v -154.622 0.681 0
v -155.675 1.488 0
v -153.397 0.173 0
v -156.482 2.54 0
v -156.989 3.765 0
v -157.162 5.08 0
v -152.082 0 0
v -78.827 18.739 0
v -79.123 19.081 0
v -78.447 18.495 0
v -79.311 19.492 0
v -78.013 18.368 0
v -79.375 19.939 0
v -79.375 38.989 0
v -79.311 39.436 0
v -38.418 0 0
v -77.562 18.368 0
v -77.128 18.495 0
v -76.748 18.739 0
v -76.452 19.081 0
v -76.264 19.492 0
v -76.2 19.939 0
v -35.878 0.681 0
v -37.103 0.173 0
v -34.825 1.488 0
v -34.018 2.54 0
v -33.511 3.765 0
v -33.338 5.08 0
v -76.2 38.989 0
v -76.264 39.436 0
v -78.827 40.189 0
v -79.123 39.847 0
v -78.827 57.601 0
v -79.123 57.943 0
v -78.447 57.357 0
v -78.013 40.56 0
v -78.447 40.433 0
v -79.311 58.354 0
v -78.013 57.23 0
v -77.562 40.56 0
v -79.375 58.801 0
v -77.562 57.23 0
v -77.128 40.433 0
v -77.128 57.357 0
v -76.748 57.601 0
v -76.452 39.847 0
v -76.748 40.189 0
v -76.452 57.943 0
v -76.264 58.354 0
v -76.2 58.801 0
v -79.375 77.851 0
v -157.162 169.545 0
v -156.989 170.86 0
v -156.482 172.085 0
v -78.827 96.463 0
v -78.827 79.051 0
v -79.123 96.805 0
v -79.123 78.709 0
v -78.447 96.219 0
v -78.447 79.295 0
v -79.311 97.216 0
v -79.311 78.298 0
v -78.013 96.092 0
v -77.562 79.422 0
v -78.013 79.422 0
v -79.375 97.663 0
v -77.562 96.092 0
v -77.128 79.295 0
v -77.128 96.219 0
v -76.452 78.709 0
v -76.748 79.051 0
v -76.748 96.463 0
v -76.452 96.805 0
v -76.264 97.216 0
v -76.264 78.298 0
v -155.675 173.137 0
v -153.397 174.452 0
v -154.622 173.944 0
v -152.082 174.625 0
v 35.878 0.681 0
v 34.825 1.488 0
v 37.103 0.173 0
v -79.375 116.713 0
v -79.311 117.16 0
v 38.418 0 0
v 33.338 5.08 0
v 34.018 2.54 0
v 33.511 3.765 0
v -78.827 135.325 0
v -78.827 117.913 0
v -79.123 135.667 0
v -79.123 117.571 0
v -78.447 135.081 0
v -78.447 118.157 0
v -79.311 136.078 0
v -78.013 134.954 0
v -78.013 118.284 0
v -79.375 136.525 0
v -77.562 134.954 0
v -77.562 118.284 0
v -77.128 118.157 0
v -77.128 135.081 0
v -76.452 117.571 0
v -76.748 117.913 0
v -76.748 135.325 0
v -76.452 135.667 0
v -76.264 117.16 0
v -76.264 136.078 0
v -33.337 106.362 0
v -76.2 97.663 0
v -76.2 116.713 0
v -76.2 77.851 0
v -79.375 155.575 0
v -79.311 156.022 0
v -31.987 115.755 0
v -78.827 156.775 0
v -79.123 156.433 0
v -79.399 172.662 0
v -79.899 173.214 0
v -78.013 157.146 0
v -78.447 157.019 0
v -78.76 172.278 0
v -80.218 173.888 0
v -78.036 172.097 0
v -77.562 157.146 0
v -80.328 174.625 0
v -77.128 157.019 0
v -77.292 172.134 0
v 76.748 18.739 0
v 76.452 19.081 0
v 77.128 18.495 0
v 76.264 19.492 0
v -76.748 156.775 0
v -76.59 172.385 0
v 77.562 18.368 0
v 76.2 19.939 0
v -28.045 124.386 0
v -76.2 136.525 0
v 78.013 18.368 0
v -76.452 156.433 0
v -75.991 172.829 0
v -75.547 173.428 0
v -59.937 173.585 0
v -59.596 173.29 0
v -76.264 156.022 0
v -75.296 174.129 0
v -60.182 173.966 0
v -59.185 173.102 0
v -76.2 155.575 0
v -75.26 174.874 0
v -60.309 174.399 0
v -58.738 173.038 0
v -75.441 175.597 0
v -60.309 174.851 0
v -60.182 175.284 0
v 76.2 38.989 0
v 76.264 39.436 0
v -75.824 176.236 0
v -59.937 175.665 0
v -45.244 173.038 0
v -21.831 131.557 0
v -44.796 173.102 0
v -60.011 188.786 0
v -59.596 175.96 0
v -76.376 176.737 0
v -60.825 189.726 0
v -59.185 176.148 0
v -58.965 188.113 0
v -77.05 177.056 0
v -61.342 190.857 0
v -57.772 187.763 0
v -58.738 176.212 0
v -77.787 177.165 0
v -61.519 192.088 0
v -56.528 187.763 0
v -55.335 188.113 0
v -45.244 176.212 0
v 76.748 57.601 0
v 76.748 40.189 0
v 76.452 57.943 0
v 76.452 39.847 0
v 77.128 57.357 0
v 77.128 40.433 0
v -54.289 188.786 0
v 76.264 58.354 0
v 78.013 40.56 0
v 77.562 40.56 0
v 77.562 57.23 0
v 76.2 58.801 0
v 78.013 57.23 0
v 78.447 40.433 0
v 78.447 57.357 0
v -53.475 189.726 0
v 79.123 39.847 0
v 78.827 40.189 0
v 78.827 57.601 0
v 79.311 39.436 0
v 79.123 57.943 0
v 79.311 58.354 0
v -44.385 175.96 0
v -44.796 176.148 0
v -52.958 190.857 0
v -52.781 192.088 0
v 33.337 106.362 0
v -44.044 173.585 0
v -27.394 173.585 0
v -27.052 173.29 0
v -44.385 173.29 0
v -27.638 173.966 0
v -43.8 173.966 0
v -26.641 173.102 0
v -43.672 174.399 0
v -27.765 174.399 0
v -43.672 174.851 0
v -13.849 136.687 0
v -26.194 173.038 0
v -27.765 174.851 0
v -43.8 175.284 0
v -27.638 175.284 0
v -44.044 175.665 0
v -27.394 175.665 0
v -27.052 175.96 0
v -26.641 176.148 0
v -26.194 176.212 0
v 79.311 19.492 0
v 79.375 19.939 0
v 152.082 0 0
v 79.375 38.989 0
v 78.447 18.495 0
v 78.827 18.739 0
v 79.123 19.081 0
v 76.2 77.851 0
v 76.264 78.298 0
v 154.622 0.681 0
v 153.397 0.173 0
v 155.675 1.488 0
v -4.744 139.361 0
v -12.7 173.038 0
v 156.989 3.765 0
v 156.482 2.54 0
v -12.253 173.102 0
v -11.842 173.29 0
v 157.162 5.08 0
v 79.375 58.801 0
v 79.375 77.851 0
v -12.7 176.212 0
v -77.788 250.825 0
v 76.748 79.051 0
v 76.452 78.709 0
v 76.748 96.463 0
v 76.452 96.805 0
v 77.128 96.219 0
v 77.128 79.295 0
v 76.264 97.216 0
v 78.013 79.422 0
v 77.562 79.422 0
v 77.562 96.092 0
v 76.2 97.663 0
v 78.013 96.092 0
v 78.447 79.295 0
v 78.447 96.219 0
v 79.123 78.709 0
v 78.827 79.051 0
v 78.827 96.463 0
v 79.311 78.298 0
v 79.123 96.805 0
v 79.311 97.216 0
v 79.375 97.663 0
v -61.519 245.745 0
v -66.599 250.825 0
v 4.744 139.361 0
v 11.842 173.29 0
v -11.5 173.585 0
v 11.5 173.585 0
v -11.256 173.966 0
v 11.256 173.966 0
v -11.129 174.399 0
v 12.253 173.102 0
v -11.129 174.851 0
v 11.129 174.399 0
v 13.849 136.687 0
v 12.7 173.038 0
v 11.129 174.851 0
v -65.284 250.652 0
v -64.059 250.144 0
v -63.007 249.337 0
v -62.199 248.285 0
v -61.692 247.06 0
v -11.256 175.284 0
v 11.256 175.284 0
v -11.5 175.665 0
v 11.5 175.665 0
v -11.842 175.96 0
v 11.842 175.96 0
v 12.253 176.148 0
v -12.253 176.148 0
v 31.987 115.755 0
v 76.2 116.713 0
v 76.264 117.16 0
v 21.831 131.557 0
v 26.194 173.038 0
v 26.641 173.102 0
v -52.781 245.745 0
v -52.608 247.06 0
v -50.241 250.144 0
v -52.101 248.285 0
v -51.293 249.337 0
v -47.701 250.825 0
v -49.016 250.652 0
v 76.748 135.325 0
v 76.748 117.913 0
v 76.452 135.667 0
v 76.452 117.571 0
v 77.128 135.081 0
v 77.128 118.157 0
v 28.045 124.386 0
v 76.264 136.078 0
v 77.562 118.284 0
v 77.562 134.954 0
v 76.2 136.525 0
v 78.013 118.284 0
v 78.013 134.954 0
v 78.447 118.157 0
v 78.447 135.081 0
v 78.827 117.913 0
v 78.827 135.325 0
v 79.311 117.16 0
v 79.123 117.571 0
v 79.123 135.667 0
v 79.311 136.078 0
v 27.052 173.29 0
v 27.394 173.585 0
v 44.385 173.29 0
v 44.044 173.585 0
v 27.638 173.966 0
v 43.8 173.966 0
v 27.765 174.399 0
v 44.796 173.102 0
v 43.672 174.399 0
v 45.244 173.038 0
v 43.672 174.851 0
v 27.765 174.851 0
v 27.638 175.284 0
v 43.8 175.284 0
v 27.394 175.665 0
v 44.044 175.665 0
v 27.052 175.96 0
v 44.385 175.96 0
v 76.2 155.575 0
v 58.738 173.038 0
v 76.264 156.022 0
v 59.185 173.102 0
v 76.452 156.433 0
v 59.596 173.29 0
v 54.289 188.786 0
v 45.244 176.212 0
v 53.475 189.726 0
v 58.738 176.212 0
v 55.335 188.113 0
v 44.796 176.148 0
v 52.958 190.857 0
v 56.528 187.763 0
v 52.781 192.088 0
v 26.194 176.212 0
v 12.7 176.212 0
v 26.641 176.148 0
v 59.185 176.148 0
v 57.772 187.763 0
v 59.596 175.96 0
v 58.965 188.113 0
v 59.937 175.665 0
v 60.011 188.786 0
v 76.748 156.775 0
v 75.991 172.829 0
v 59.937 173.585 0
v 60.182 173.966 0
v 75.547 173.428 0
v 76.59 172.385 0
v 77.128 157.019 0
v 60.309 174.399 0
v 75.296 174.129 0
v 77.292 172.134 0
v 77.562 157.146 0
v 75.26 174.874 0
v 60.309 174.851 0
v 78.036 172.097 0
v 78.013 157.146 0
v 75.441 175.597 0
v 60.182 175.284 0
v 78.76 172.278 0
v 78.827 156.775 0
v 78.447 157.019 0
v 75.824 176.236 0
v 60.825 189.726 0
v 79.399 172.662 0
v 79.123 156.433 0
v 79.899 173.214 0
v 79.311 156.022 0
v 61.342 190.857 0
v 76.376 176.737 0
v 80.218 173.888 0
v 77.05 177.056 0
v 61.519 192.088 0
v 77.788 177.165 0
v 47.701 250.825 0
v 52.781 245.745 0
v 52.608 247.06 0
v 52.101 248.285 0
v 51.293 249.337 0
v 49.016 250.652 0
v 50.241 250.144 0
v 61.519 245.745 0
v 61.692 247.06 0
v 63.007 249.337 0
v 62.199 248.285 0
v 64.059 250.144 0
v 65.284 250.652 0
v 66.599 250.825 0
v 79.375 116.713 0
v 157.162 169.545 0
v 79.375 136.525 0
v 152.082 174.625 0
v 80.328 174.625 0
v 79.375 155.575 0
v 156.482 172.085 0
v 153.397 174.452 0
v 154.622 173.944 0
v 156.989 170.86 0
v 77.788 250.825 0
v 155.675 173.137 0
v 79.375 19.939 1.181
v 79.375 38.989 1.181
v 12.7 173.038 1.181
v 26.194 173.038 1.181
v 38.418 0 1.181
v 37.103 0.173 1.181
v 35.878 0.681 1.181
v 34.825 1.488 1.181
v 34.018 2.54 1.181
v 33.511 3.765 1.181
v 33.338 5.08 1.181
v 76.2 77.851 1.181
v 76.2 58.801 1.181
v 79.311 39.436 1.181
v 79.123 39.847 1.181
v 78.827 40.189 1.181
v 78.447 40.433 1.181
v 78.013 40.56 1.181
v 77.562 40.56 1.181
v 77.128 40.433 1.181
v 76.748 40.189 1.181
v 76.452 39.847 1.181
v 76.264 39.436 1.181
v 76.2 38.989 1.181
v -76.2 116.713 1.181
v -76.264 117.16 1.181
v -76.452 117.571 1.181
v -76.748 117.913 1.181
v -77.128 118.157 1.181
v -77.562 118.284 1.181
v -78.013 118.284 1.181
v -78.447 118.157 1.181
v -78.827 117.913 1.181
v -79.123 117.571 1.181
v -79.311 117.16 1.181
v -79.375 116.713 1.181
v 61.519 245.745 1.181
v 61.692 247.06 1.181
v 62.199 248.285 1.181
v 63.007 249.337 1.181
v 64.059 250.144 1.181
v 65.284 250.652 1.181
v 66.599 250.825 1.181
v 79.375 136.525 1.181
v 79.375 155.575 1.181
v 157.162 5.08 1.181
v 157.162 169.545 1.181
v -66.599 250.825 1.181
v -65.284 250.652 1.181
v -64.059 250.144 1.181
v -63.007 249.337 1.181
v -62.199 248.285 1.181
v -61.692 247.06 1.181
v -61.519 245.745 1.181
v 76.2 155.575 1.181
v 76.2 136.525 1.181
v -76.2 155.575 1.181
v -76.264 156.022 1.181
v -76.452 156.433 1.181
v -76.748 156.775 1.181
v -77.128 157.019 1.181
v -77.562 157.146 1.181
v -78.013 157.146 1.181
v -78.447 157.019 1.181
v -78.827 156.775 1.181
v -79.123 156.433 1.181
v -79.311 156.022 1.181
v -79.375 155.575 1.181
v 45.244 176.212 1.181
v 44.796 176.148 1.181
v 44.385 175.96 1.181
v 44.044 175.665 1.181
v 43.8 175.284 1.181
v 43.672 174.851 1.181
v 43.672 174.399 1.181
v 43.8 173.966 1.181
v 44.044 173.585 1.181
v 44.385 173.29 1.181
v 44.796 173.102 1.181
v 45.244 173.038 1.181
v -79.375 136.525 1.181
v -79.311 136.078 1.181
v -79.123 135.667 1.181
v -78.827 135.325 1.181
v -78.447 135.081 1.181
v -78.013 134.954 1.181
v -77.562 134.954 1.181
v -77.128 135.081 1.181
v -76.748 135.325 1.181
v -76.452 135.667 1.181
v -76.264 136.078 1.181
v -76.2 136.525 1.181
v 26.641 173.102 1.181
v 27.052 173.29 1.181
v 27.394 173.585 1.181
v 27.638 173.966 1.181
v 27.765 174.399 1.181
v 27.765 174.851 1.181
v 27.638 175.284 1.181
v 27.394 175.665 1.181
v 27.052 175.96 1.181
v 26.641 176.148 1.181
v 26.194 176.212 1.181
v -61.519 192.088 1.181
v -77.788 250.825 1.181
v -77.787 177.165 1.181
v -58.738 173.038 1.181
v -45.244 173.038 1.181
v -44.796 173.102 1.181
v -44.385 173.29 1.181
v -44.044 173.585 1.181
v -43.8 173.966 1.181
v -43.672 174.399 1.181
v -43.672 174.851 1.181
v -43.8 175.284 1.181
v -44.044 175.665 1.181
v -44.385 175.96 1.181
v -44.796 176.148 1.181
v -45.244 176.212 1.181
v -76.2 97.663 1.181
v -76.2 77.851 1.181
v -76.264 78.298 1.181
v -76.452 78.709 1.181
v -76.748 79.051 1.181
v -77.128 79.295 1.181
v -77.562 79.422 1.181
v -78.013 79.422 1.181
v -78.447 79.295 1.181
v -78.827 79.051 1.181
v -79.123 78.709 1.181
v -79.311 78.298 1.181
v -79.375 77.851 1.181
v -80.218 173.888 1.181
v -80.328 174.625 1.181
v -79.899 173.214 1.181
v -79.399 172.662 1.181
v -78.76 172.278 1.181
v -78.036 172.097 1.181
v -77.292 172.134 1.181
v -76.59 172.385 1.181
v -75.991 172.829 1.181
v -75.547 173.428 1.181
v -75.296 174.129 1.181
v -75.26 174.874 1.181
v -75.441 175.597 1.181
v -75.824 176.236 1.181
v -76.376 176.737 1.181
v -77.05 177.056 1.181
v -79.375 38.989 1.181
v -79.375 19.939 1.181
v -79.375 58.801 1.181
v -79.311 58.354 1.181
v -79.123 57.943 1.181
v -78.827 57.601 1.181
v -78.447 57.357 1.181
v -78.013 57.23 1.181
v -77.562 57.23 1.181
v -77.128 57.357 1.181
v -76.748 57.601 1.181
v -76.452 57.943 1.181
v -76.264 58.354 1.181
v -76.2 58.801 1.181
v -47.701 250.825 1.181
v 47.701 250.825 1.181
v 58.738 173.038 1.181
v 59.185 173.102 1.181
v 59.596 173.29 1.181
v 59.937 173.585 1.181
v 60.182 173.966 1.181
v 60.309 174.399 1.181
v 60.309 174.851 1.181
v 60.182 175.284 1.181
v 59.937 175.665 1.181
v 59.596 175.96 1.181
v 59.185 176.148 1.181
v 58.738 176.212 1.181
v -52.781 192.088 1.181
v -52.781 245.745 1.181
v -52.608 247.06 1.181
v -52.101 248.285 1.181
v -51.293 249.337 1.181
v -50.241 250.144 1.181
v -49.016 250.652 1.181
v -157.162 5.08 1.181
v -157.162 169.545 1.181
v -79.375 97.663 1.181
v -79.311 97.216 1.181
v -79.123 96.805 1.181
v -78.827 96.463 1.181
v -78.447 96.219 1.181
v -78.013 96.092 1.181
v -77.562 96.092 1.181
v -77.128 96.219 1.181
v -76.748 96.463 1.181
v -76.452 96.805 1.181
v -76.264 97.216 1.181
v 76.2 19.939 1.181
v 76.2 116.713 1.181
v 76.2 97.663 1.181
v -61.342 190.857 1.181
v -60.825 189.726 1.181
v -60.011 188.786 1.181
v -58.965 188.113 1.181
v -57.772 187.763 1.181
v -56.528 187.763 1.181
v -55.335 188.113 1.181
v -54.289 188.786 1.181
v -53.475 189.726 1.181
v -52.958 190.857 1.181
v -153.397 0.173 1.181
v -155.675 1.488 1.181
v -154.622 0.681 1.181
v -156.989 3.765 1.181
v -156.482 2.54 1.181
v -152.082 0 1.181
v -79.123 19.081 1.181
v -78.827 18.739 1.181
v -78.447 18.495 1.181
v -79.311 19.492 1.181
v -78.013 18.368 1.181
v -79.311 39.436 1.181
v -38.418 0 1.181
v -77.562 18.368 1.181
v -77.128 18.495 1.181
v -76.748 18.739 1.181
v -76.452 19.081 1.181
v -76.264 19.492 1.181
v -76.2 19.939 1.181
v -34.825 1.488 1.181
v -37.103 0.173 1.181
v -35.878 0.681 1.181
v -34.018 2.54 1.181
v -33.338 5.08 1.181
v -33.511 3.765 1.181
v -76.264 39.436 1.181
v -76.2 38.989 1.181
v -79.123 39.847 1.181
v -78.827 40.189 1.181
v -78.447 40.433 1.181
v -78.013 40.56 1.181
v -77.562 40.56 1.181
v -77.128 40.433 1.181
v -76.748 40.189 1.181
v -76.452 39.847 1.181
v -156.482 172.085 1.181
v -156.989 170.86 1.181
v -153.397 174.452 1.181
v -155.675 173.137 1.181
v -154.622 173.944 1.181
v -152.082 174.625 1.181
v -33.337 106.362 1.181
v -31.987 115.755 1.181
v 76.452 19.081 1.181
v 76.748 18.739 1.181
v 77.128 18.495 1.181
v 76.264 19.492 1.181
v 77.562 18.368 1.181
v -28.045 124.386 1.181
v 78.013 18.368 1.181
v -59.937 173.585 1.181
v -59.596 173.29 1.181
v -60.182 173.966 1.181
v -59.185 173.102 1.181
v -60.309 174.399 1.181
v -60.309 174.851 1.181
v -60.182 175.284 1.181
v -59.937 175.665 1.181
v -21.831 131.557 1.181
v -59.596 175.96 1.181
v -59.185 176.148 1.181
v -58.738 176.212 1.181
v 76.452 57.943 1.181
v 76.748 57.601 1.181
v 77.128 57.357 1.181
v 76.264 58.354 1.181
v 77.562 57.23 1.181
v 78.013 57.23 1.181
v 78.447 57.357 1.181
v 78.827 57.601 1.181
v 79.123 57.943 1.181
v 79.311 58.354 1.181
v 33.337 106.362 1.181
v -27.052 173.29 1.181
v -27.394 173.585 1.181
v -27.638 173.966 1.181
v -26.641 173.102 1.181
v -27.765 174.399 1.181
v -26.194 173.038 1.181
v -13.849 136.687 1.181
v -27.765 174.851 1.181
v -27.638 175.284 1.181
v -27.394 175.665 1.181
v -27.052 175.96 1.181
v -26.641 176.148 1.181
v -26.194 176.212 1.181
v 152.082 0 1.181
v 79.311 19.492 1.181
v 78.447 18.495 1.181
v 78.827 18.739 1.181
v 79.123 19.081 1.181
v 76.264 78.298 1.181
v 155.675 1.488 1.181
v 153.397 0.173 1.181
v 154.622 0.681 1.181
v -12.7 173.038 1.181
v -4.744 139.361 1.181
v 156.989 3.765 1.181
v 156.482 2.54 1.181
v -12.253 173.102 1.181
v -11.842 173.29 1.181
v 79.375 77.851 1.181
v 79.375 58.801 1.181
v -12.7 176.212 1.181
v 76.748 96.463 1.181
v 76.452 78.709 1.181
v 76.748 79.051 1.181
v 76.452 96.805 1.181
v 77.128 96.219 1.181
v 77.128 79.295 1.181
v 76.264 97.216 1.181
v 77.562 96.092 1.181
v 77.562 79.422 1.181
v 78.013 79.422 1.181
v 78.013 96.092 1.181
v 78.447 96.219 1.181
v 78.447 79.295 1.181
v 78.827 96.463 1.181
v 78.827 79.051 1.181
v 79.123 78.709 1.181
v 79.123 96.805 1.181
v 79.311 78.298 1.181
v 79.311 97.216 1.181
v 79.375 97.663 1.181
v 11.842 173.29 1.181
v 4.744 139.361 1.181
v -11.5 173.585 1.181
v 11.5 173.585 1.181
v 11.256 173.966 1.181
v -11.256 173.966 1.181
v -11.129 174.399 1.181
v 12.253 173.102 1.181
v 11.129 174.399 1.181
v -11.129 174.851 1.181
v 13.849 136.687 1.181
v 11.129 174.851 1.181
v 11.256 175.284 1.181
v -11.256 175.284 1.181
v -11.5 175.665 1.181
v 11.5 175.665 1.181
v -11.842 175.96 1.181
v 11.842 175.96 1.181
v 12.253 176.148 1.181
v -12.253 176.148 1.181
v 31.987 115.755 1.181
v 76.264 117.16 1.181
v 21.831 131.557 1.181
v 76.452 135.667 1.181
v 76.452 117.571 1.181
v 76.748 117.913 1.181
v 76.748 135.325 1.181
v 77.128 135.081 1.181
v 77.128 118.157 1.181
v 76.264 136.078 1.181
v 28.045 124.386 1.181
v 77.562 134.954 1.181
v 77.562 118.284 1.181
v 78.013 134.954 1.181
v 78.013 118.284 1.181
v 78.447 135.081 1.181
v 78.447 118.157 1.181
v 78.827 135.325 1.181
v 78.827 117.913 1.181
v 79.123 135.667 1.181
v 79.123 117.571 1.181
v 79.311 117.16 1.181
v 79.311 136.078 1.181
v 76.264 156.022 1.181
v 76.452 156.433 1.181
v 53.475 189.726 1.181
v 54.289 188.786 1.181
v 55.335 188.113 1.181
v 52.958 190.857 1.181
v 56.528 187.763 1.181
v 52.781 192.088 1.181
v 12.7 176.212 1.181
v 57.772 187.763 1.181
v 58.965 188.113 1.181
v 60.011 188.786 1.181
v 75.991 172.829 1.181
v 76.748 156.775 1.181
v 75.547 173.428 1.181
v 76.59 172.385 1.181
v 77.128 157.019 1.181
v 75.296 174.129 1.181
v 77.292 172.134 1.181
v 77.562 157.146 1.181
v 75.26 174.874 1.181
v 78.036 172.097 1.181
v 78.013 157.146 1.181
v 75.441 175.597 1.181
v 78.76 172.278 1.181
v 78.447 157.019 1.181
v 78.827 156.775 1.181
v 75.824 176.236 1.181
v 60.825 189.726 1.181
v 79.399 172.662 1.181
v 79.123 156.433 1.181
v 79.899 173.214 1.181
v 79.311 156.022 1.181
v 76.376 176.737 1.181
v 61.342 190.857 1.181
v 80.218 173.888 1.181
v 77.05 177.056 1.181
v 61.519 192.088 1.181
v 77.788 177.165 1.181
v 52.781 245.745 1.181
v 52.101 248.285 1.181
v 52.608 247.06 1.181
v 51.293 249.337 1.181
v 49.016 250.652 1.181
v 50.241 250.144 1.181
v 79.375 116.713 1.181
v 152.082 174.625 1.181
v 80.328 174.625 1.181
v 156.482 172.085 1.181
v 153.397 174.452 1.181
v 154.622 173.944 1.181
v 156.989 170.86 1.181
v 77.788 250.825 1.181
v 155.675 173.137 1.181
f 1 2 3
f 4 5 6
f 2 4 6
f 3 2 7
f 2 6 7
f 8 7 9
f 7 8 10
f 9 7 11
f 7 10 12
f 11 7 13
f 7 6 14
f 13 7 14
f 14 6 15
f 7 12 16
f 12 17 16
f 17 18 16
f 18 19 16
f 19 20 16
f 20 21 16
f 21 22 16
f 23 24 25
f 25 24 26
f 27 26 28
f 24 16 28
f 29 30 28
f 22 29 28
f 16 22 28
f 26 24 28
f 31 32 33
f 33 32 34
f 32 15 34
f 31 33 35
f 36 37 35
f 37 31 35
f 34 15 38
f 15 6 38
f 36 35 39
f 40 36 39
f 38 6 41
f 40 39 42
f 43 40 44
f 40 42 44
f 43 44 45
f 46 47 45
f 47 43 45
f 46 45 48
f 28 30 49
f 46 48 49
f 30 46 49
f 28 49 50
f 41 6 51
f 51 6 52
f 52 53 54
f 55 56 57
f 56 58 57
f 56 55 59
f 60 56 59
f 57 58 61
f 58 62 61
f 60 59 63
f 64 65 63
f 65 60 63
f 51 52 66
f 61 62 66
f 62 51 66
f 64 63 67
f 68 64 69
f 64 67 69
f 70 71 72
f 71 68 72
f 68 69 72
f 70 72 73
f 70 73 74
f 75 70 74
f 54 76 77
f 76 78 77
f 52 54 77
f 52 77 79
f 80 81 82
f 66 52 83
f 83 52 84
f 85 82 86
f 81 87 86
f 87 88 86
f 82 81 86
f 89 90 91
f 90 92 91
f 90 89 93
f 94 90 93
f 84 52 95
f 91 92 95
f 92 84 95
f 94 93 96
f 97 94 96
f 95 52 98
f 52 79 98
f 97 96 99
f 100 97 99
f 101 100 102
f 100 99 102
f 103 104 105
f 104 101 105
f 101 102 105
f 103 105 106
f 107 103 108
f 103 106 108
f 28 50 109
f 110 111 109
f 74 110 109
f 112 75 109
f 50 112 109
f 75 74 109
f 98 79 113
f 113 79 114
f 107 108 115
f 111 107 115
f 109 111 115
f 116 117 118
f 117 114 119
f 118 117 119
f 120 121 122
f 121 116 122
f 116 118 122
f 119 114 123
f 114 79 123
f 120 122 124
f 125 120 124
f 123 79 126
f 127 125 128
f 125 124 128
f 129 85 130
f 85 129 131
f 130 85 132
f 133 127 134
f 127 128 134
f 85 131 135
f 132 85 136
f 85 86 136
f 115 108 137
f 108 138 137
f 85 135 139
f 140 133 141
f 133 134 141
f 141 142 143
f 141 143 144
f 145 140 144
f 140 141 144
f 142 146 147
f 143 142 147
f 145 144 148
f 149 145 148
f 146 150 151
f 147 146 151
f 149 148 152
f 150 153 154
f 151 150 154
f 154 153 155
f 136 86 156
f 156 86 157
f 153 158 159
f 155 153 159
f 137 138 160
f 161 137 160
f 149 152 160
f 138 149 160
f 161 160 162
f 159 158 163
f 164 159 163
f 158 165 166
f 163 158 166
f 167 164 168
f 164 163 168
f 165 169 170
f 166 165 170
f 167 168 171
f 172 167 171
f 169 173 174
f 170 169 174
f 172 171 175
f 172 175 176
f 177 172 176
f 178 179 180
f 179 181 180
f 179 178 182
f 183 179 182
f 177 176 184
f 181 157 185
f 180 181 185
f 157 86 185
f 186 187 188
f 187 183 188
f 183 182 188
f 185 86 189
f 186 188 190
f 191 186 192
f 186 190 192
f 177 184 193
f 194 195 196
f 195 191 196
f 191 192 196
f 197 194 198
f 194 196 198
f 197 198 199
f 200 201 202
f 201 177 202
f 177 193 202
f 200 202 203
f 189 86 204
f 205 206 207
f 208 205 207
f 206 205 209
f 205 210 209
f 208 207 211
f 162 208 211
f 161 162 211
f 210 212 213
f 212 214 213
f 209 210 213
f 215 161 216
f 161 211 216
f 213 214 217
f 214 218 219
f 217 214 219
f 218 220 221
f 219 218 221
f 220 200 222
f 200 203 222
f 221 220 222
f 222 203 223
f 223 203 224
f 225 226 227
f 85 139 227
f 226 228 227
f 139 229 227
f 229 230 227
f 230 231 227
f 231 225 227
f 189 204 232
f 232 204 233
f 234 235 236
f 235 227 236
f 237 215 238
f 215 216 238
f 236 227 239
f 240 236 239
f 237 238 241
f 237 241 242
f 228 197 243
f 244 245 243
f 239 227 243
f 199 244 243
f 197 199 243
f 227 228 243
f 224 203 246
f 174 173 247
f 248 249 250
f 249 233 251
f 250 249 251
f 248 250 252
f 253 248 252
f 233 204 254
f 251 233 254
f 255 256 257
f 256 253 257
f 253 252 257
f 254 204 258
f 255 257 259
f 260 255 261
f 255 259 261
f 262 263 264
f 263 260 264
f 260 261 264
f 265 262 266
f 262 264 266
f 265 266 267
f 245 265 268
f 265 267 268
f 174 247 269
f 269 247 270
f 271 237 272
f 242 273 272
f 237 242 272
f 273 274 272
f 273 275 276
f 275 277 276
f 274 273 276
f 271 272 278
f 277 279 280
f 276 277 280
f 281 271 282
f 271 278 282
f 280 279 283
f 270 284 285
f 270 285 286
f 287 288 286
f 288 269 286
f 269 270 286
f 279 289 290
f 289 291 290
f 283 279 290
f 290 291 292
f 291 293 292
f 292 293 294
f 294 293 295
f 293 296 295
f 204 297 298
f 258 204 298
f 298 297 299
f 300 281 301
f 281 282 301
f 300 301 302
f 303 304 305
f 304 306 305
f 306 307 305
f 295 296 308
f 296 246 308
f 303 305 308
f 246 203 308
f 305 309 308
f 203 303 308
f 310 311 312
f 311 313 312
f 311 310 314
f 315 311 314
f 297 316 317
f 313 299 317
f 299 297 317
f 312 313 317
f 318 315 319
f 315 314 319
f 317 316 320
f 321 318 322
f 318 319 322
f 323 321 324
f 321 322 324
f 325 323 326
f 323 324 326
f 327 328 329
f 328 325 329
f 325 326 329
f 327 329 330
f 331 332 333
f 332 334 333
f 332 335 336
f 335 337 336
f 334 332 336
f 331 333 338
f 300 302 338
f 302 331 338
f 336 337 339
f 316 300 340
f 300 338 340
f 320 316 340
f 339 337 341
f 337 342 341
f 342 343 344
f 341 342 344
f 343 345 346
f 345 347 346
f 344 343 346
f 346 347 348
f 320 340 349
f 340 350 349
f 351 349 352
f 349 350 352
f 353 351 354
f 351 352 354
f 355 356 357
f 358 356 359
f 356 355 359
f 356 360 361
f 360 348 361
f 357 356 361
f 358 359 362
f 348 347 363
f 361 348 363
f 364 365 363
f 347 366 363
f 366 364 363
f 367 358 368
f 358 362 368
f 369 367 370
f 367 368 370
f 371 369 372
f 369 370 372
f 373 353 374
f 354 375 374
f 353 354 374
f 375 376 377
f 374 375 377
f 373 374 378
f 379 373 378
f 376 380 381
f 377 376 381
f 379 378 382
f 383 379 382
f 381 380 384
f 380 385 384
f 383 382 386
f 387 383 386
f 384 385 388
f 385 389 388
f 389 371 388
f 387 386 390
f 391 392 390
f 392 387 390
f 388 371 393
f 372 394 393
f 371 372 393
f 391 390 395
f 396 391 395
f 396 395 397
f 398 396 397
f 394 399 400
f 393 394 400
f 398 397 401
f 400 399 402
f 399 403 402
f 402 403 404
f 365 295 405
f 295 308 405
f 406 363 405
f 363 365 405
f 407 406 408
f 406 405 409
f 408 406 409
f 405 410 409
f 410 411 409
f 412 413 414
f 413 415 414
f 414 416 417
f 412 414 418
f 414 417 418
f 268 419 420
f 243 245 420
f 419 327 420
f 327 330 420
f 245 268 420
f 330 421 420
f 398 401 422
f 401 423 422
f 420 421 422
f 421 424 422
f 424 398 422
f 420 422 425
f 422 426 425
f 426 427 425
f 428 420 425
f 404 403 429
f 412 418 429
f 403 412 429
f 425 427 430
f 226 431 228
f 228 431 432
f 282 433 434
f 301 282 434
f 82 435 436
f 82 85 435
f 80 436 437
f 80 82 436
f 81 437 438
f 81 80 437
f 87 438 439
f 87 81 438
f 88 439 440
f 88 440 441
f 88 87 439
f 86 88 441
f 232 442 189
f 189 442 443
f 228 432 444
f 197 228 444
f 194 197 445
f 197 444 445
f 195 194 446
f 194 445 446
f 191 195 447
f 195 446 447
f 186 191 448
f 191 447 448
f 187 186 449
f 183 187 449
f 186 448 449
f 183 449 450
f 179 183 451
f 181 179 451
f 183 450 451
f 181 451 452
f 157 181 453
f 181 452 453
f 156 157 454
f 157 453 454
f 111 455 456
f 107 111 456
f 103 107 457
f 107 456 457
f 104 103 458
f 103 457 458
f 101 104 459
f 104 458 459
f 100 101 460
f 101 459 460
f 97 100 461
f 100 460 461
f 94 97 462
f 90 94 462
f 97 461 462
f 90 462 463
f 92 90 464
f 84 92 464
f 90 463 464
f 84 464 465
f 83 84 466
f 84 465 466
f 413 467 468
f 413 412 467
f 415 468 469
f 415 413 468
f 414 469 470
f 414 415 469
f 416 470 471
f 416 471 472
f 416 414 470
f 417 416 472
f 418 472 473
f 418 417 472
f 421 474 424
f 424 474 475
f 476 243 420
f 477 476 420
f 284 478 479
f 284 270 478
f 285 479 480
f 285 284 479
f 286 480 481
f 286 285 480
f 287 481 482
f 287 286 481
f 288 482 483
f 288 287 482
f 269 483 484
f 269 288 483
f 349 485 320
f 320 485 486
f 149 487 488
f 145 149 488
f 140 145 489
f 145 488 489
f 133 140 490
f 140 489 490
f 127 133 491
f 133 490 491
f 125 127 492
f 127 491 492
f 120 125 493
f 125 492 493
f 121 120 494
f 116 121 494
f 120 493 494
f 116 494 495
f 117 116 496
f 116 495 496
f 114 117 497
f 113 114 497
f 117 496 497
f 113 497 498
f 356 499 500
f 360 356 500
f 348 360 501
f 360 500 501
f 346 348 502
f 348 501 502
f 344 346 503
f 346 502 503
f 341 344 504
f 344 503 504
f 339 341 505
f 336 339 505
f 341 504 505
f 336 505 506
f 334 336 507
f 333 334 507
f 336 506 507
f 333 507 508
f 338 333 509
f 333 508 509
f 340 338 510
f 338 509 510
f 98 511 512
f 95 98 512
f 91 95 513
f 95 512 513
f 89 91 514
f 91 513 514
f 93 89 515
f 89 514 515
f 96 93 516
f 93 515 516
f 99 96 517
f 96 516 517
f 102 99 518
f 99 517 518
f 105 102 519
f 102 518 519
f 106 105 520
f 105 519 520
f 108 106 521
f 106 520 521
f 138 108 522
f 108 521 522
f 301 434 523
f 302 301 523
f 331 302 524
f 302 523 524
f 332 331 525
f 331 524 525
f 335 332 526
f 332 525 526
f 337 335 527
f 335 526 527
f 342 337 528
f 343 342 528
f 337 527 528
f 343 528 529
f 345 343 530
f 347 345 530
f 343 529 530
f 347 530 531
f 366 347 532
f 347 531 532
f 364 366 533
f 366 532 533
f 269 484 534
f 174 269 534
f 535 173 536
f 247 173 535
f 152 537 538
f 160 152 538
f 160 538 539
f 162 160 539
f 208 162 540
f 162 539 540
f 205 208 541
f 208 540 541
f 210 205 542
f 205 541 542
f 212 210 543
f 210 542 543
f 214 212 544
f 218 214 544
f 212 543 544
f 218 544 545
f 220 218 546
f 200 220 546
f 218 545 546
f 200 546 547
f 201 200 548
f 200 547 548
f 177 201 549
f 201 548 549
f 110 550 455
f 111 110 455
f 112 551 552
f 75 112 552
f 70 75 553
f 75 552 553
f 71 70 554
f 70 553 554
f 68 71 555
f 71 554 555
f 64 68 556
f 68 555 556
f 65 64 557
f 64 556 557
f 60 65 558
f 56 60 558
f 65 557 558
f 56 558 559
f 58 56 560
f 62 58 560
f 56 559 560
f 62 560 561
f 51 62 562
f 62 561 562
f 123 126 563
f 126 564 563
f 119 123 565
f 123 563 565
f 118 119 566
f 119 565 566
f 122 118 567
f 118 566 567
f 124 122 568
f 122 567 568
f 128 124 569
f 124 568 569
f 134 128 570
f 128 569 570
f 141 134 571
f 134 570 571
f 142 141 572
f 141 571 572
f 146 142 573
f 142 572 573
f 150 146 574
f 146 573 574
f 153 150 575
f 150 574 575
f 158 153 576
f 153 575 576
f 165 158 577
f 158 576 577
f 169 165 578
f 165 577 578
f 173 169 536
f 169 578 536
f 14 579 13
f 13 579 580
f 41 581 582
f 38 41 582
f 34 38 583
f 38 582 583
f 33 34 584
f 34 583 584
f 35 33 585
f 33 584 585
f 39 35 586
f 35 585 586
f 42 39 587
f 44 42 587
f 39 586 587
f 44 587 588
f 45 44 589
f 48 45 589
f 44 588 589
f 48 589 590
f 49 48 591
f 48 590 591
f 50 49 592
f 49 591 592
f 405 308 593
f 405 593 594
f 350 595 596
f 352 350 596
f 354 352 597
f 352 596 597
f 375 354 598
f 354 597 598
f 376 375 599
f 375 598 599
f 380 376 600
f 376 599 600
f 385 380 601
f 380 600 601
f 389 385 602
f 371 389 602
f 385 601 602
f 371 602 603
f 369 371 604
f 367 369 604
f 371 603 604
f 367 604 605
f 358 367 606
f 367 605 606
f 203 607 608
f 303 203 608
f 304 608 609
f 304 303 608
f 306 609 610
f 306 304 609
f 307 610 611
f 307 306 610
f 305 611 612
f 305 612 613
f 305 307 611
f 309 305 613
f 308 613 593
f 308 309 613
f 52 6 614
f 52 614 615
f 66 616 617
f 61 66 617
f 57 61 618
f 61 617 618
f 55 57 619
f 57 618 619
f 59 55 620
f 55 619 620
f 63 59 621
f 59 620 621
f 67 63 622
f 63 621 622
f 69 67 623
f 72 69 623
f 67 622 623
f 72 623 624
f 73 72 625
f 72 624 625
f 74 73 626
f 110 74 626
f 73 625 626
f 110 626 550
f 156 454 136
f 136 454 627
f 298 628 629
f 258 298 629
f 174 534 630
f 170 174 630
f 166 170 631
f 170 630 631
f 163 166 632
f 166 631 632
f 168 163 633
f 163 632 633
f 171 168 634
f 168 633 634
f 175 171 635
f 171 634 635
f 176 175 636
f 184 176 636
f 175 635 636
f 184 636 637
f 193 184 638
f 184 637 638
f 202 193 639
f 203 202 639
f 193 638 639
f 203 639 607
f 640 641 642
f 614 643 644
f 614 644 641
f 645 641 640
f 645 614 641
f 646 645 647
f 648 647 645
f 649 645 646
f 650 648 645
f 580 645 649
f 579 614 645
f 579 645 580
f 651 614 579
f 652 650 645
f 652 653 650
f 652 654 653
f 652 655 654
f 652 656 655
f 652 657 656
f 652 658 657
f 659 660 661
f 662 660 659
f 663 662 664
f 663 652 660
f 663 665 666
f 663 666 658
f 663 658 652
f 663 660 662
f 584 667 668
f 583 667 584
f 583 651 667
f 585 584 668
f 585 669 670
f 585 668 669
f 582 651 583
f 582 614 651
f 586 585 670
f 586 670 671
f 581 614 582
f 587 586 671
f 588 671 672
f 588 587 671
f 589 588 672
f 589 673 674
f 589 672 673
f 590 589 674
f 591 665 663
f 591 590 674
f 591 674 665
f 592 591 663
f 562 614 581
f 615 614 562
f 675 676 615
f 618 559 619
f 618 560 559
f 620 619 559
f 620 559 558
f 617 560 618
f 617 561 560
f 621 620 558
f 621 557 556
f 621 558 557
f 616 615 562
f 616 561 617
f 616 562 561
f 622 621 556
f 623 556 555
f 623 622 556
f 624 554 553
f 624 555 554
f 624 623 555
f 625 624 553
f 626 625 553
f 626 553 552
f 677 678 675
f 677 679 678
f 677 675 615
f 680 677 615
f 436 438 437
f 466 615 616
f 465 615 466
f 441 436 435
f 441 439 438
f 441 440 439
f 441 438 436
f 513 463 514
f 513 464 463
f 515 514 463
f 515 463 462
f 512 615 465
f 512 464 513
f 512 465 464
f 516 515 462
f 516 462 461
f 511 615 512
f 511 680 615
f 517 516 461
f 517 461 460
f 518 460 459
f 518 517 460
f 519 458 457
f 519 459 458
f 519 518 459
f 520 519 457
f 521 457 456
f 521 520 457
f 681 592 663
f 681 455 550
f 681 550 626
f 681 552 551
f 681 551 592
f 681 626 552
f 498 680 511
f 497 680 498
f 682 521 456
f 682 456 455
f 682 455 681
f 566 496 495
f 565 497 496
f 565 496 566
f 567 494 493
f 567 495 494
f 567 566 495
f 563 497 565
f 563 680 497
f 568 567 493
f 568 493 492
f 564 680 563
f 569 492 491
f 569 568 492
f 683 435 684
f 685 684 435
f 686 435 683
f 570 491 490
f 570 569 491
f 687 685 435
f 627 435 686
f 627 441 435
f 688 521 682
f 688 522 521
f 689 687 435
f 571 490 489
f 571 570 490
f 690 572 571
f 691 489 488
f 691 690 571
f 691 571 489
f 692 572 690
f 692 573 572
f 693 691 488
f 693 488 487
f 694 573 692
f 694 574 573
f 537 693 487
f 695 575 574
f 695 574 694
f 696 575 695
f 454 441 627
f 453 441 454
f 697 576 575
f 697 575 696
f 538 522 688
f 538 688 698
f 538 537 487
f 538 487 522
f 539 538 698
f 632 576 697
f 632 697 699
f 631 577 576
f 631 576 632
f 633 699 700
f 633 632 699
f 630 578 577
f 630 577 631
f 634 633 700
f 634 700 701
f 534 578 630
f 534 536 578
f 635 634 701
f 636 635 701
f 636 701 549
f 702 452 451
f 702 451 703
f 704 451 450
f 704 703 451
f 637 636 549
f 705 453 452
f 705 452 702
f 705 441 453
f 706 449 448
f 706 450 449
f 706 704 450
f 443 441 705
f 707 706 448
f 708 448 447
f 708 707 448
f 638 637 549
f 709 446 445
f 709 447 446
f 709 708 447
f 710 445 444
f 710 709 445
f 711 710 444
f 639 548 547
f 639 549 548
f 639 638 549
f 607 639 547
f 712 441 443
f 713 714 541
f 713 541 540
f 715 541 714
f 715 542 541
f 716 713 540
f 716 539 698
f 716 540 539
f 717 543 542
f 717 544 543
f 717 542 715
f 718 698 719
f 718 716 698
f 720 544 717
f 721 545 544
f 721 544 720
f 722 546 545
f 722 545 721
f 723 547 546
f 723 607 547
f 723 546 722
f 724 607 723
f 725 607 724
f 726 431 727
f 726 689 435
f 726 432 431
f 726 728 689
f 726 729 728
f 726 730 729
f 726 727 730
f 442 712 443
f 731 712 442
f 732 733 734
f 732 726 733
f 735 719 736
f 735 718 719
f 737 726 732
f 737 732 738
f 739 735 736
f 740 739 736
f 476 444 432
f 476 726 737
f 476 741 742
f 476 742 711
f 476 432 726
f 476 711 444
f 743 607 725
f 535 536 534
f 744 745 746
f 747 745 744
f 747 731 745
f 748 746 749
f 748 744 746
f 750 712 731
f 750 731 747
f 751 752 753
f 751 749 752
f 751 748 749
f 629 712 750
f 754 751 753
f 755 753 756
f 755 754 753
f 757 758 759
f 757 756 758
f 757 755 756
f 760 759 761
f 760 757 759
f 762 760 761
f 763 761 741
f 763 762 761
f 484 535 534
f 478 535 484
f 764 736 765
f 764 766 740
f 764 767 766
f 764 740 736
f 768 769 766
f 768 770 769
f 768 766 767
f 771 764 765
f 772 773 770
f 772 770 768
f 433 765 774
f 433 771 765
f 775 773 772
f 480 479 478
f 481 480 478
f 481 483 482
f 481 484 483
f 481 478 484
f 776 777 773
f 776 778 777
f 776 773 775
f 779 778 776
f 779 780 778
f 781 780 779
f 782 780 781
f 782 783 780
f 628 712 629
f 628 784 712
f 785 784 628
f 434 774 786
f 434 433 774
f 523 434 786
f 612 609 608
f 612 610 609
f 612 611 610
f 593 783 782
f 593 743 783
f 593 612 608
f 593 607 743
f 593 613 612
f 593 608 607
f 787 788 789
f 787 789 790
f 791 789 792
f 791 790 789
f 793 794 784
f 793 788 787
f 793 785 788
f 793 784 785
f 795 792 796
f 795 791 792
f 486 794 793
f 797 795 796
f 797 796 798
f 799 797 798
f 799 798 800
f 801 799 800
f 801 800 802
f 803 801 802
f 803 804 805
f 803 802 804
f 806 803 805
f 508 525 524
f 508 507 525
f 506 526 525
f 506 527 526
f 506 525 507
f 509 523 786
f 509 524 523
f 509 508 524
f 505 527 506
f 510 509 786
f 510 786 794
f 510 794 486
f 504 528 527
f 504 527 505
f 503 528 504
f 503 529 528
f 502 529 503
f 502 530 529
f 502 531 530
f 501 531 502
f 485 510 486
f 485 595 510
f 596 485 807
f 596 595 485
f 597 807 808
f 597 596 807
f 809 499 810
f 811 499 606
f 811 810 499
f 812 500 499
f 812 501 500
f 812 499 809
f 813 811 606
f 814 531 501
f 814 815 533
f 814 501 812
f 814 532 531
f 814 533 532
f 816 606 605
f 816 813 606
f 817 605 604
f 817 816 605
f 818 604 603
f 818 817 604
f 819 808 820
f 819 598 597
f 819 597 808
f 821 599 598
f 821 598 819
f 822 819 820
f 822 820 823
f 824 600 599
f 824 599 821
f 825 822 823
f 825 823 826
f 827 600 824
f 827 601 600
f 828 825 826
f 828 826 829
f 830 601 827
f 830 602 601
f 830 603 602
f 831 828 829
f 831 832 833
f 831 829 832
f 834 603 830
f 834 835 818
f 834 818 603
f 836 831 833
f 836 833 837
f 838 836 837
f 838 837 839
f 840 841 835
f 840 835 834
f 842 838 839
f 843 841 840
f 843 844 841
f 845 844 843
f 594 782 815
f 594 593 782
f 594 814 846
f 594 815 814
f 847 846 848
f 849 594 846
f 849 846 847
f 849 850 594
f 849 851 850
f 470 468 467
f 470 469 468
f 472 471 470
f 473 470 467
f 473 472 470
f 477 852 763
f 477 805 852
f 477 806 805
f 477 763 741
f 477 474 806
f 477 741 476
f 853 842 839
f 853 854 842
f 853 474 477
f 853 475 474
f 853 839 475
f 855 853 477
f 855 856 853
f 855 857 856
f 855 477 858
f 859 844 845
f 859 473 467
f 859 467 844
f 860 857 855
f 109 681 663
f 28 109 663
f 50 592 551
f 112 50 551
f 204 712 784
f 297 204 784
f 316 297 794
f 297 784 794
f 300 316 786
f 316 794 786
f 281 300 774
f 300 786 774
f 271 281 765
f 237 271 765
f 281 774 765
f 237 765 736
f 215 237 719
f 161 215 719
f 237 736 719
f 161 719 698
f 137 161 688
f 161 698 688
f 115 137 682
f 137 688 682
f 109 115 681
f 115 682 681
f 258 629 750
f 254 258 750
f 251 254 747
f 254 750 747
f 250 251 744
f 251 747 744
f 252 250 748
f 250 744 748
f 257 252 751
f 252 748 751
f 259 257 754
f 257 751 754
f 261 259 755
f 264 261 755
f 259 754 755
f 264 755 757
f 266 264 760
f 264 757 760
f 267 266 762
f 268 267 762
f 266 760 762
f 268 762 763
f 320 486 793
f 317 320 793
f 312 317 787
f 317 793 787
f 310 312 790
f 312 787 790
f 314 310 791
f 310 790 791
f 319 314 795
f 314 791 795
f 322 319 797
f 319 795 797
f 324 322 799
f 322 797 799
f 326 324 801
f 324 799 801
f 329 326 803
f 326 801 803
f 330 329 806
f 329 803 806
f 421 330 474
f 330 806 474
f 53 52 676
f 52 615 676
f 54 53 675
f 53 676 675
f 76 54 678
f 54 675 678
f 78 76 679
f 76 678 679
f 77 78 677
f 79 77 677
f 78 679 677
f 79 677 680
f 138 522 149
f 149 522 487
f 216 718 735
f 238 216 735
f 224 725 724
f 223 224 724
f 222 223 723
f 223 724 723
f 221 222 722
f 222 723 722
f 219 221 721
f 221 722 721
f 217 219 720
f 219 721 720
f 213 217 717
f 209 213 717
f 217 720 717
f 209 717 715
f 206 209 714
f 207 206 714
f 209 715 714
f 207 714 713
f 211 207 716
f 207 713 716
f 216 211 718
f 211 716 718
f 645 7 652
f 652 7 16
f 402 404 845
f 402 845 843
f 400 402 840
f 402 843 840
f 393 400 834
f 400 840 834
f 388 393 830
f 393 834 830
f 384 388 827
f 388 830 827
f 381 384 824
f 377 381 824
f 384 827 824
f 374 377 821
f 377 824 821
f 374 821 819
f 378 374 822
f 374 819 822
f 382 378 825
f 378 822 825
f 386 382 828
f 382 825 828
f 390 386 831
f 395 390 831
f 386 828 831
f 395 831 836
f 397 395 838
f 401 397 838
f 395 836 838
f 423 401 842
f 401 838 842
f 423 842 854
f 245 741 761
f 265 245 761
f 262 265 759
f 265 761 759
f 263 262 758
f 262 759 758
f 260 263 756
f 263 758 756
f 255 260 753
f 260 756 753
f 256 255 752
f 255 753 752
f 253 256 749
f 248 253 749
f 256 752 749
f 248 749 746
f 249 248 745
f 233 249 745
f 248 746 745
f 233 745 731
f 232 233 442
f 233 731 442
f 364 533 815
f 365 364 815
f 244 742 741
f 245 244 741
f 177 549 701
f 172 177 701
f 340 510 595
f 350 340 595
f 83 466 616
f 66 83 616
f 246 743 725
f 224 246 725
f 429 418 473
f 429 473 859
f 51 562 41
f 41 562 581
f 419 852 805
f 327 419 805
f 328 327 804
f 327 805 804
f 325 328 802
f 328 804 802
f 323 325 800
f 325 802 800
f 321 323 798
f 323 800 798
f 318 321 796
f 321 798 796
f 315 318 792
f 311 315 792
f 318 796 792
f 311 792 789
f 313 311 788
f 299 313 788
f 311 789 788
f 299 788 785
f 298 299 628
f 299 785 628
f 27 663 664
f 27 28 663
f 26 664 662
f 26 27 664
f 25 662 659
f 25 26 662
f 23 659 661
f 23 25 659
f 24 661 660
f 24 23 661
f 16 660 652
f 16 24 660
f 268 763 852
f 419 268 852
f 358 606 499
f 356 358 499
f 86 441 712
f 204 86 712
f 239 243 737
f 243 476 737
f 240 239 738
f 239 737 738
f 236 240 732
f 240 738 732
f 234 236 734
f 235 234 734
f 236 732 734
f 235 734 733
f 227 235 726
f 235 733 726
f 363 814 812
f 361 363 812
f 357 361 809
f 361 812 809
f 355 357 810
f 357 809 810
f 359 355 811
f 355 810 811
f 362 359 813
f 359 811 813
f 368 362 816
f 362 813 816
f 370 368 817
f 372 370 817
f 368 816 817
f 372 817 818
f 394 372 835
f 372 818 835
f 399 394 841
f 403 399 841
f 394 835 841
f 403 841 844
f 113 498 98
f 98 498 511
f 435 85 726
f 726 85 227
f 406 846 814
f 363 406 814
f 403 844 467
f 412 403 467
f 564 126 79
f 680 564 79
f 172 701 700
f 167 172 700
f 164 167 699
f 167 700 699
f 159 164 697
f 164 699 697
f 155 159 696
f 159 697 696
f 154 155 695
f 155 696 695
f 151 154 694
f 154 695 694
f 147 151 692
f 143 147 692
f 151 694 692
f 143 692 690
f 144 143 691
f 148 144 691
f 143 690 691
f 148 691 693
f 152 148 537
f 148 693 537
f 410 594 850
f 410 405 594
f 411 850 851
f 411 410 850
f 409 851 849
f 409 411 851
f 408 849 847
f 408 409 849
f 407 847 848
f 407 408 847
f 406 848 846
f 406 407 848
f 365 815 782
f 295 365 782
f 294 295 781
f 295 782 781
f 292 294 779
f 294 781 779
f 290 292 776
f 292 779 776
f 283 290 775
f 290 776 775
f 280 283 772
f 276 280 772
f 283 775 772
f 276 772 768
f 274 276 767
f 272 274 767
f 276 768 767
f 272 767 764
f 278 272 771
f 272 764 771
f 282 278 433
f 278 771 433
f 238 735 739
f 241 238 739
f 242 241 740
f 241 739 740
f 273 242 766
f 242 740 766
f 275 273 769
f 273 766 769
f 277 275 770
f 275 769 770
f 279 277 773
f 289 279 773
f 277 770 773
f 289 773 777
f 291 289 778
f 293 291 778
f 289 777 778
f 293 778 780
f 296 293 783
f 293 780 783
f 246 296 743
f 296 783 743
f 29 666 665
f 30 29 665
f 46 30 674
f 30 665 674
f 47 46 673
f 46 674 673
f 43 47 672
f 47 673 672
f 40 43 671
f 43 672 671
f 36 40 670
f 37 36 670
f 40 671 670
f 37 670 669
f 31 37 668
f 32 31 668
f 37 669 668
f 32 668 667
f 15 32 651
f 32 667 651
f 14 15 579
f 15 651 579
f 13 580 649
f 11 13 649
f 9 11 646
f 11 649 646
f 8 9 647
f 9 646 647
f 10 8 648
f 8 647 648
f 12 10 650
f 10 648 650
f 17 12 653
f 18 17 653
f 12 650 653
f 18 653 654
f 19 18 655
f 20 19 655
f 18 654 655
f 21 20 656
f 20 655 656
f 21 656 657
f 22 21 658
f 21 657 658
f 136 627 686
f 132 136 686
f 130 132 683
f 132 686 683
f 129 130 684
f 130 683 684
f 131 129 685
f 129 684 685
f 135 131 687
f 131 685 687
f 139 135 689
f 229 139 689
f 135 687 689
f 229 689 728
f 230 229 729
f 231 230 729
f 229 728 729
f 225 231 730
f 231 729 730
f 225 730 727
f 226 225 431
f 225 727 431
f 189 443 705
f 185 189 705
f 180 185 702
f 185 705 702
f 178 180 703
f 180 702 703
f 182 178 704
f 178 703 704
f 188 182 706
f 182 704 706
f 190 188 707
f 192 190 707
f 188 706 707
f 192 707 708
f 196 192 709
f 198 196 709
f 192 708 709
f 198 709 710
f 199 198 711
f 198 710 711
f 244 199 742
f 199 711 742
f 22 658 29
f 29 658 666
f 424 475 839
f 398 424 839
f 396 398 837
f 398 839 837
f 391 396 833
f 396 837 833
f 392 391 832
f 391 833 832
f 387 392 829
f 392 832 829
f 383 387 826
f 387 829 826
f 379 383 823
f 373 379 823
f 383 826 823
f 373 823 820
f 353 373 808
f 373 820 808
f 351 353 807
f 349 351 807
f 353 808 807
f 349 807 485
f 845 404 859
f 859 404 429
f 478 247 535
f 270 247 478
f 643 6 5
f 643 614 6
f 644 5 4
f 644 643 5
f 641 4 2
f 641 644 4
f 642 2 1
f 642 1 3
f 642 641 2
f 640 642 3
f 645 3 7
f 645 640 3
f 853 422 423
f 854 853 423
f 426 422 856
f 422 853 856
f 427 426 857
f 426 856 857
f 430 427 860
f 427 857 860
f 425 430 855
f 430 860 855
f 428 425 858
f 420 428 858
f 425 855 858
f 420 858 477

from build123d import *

# Parameters (mm, degrees)
F0_W     = 155.575
F0_H     = 174.625
F0_W_2   = 79.375
F0_H_2   = 76.2
F1_DEPTH = 1.1811
F3_DEPTH = 1.1811
F4_R     = 2.54
F5_DEPTH = 1.1811
F6_R     = 5.08


with BuildPart() as f1:
    # F0 (on Top) → F1 (new body)
    with BuildSketch(Plane.XY):
        with Locations((0, 87.3125)):
            Rectangle(F0_W, F0_H)
        with Locations((-117.475, 87.3125)):
            Rectangle(F0_W_2, F0_H)
        with Locations((117.475, 87.3125)):
            Rectangle(F0_W_2, F0_H)
        with Locations((0, 212.725)):
            Rectangle(F0_W, F0_H_2)
    extrude(amount=F1_DEPTH)

    # F2 (on face) → F3 (cut, through all)
    with BuildSketch(Plane.XY.offset(1.1811)):
        with BuildLine():
            Line((33.3375, 0), (33.3375, 106.3625))
            ThreePointArc((33.3375, 106.3625), (0, 139.7), (-33.3375, 106.3625))
            Line((-33.3375, 106.3625), (-33.3375, 0))
            Line((-33.3375, 0), (33.3375, 0))
        make_face()
        with BuildLine():
            ThreePointArc((-52.7812, 250.825), (-57.15, 255.1938), (-61.5188, 250.825))
            Line((-61.5188, 250.825), (-61.5188, 192.0875))
            ThreePointArc((-61.5188, 192.0875), (-57.15, 187.7187), (-52.7812, 192.0875))
            Line((-52.7812, 192.0875), (-52.7812, 250.825))
        make_face()
        with BuildLine():
            ThreePointArc((61.5188, 250.825), (57.15, 255.1938), (52.7812, 250.825))
            Line((52.7812, 250.825), (52.7812, 192.0875))
            ThreePointArc((52.7812, 192.0875), (57.15, 187.7187), (61.5188, 192.0875))
            Line((61.5188, 192.0875), (61.5188, 250.825))
        make_face()
    extrude(amount=-F3_DEPTH, mode=Mode.SUBTRACT)

    # F4 (on face) → F5 (cut, through all)
    with BuildSketch(Plane.XY.offset(1.1811)):
        with BuildLine():
            ThreePointArc((-76.2, 155.575), (-77.7875, 157.1625), (-79.375, 155.575))
            Line((-79.375, 155.575), (-79.375, 136.525))
            ThreePointArc((-79.375, 136.525), (-77.7875, 134.9375), (-76.2, 136.525))
            Line((-76.2, 136.525), (-76.2, 155.575))
        make_face()
        with BuildLine():
            ThreePointArc((-76.2, 116.713), (-77.7875, 118.3005), (-79.375, 116.713))
            Line((-79.375, 116.713), (-79.375, 97.663))
            ThreePointArc((-79.375, 97.663), (-77.7875, 96.0755), (-76.2, 97.663))
            Line((-76.2, 97.663), (-76.2, 116.713))
        make_face()
        with BuildLine():
            ThreePointArc((-76.2, 77.851), (-77.7875, 79.4385), (-79.375, 77.851))
            Line((-79.375, 77.851), (-79.375, 58.801))
            ThreePointArc((-79.375, 58.801), (-77.7875, 57.2135), (-76.2, 58.801))
            Line((-76.2, 58.801), (-76.2, 77.851))
        make_face()
        with BuildLine():
            ThreePointArc((-76.2, 38.989), (-77.7875, 40.5765), (-79.375, 38.989))
            Line((-79.375, 38.989), (-79.375, 19.939))
            ThreePointArc((-79.375, 19.939), (-77.7875, 18.3515), (-76.2, 19.939))
            Line((-76.2, 19.939), (-76.2, 38.989))
        make_face()
        with BuildLine():
            Line((79.375, 136.525), (79.375, 155.575))
            ThreePointArc((79.375, 155.575), (77.7875, 157.1625), (76.2, 155.575))
            Line((76.2, 155.575), (76.2, 136.525))
            ThreePointArc((76.2, 136.525), (77.7875, 134.9375), (79.375, 136.525))
        make_face()
        with BuildLine():
            Line((79.375, 97.663), (79.375, 116.713))
            ThreePointArc((79.375, 116.713), (77.7875, 118.3005), (76.2, 116.713))
            Line((76.2, 116.713), (76.2, 97.663))
            ThreePointArc((76.2, 97.663), (77.7875, 96.0755), (79.375, 97.663))
        make_face()
        with BuildLine():
            Line((76.2, 77.851), (76.2, 58.801))
            ThreePointArc((76.2, 58.801), (77.7875, 57.2135), (79.375, 58.801))
            Line((79.375, 58.801), (79.375, 77.851))
            ThreePointArc((79.375, 77.851), (77.7875, 79.4385), (76.2, 77.851))
        make_face()
        with BuildLine():
            Line((79.375, 19.939), (79.375, 38.989))
            ThreePointArc((79.375, 38.989), (77.7875, 40.5765), (76.2, 38.989))
            Line((76.2, 38.989), (76.2, 19.939))
            ThreePointArc((76.2, 19.939), (77.7875, 18.3515), (79.375, 19.939))
        make_face()
        with BuildLine():
            ThreePointArc((-58.7375, 176.2125), (-60.325, 174.625), (-58.7375, 173.0375))
            Line((-58.7375, 173.0375), (-45.24375, 173.0375))
            ThreePointArc((-45.24375, 173.0375), (-43.65625, 174.625), (-45.24375, 176.2125))
            Line((-45.24375, 176.2125), (-58.7375, 176.2125))
        make_face()
        with BuildLine():
            ThreePointArc((-26.19375, 176.2125), (-27.78125, 174.625), (-26.19375, 173.0375))
            Line((-26.19375, 173.0375), (-12.7, 173.0375))
            ThreePointArc((-12.7, 173.0375), (-11.1125, 174.625), (-12.7, 176.2125))
            Line((-12.7, 176.2125), (-26.19375, 176.2125))
        make_face()
        with BuildLine():
            ThreePointArc((12.7, 176.2125), (11.1125, 174.625), (12.7, 173.0375))
            Line((12.7, 173.0375), (26.19375, 173.0375))
            ThreePointArc((26.19375, 173.0375), (27.78125, 174.625), (26.19375, 176.2125))
            Line((26.19375, 176.2125), (12.7, 176.2125))
        make_face()
        with BuildLine():
            ThreePointArc((45.24375, 176.2125), (43.65625, 174.625), (45.24375, 173.0375))
            Line((45.24375, 173.0375), (58.7375, 173.0375))
            ThreePointArc((58.7375, 173.0375), (60.325, 174.625), (58.7375, 176.2125))
            Line((58.7375, 176.2125), (45.24375, 176.2125))
        make_face()
        with Locations((-77.7875, 174.625)):
            Circle(F4_R)
        with Locations((77.7875, 174.625)):
            Circle(F4_R)
    extrude(amount=-F5_DEPTH, mode=Mode.SUBTRACT)

    # F6
    f6_edges = [f1.edges().sort_by_distance(p)[0] for p in [
        (-157.1625, 174.625, 0.59055),
        (-61.5188, 250.825, 0.59055),
        (-52.7812, 250.825, 0.59055),
        (52.7812, 250.825, 0.59055),
        (61.5188, 250.825, 0.59055),
        (157.1625, 174.625, 0.59055),
        (-157.1625, 0, 0.59055),
        (33.3375, 0, 0.59055),
        (-33.3375, 0, 0.59055),
        (157.1625, 0, 0.59055),
    ]]
    fillet(f6_edges, radius=F6_R)


solid = f1.part
